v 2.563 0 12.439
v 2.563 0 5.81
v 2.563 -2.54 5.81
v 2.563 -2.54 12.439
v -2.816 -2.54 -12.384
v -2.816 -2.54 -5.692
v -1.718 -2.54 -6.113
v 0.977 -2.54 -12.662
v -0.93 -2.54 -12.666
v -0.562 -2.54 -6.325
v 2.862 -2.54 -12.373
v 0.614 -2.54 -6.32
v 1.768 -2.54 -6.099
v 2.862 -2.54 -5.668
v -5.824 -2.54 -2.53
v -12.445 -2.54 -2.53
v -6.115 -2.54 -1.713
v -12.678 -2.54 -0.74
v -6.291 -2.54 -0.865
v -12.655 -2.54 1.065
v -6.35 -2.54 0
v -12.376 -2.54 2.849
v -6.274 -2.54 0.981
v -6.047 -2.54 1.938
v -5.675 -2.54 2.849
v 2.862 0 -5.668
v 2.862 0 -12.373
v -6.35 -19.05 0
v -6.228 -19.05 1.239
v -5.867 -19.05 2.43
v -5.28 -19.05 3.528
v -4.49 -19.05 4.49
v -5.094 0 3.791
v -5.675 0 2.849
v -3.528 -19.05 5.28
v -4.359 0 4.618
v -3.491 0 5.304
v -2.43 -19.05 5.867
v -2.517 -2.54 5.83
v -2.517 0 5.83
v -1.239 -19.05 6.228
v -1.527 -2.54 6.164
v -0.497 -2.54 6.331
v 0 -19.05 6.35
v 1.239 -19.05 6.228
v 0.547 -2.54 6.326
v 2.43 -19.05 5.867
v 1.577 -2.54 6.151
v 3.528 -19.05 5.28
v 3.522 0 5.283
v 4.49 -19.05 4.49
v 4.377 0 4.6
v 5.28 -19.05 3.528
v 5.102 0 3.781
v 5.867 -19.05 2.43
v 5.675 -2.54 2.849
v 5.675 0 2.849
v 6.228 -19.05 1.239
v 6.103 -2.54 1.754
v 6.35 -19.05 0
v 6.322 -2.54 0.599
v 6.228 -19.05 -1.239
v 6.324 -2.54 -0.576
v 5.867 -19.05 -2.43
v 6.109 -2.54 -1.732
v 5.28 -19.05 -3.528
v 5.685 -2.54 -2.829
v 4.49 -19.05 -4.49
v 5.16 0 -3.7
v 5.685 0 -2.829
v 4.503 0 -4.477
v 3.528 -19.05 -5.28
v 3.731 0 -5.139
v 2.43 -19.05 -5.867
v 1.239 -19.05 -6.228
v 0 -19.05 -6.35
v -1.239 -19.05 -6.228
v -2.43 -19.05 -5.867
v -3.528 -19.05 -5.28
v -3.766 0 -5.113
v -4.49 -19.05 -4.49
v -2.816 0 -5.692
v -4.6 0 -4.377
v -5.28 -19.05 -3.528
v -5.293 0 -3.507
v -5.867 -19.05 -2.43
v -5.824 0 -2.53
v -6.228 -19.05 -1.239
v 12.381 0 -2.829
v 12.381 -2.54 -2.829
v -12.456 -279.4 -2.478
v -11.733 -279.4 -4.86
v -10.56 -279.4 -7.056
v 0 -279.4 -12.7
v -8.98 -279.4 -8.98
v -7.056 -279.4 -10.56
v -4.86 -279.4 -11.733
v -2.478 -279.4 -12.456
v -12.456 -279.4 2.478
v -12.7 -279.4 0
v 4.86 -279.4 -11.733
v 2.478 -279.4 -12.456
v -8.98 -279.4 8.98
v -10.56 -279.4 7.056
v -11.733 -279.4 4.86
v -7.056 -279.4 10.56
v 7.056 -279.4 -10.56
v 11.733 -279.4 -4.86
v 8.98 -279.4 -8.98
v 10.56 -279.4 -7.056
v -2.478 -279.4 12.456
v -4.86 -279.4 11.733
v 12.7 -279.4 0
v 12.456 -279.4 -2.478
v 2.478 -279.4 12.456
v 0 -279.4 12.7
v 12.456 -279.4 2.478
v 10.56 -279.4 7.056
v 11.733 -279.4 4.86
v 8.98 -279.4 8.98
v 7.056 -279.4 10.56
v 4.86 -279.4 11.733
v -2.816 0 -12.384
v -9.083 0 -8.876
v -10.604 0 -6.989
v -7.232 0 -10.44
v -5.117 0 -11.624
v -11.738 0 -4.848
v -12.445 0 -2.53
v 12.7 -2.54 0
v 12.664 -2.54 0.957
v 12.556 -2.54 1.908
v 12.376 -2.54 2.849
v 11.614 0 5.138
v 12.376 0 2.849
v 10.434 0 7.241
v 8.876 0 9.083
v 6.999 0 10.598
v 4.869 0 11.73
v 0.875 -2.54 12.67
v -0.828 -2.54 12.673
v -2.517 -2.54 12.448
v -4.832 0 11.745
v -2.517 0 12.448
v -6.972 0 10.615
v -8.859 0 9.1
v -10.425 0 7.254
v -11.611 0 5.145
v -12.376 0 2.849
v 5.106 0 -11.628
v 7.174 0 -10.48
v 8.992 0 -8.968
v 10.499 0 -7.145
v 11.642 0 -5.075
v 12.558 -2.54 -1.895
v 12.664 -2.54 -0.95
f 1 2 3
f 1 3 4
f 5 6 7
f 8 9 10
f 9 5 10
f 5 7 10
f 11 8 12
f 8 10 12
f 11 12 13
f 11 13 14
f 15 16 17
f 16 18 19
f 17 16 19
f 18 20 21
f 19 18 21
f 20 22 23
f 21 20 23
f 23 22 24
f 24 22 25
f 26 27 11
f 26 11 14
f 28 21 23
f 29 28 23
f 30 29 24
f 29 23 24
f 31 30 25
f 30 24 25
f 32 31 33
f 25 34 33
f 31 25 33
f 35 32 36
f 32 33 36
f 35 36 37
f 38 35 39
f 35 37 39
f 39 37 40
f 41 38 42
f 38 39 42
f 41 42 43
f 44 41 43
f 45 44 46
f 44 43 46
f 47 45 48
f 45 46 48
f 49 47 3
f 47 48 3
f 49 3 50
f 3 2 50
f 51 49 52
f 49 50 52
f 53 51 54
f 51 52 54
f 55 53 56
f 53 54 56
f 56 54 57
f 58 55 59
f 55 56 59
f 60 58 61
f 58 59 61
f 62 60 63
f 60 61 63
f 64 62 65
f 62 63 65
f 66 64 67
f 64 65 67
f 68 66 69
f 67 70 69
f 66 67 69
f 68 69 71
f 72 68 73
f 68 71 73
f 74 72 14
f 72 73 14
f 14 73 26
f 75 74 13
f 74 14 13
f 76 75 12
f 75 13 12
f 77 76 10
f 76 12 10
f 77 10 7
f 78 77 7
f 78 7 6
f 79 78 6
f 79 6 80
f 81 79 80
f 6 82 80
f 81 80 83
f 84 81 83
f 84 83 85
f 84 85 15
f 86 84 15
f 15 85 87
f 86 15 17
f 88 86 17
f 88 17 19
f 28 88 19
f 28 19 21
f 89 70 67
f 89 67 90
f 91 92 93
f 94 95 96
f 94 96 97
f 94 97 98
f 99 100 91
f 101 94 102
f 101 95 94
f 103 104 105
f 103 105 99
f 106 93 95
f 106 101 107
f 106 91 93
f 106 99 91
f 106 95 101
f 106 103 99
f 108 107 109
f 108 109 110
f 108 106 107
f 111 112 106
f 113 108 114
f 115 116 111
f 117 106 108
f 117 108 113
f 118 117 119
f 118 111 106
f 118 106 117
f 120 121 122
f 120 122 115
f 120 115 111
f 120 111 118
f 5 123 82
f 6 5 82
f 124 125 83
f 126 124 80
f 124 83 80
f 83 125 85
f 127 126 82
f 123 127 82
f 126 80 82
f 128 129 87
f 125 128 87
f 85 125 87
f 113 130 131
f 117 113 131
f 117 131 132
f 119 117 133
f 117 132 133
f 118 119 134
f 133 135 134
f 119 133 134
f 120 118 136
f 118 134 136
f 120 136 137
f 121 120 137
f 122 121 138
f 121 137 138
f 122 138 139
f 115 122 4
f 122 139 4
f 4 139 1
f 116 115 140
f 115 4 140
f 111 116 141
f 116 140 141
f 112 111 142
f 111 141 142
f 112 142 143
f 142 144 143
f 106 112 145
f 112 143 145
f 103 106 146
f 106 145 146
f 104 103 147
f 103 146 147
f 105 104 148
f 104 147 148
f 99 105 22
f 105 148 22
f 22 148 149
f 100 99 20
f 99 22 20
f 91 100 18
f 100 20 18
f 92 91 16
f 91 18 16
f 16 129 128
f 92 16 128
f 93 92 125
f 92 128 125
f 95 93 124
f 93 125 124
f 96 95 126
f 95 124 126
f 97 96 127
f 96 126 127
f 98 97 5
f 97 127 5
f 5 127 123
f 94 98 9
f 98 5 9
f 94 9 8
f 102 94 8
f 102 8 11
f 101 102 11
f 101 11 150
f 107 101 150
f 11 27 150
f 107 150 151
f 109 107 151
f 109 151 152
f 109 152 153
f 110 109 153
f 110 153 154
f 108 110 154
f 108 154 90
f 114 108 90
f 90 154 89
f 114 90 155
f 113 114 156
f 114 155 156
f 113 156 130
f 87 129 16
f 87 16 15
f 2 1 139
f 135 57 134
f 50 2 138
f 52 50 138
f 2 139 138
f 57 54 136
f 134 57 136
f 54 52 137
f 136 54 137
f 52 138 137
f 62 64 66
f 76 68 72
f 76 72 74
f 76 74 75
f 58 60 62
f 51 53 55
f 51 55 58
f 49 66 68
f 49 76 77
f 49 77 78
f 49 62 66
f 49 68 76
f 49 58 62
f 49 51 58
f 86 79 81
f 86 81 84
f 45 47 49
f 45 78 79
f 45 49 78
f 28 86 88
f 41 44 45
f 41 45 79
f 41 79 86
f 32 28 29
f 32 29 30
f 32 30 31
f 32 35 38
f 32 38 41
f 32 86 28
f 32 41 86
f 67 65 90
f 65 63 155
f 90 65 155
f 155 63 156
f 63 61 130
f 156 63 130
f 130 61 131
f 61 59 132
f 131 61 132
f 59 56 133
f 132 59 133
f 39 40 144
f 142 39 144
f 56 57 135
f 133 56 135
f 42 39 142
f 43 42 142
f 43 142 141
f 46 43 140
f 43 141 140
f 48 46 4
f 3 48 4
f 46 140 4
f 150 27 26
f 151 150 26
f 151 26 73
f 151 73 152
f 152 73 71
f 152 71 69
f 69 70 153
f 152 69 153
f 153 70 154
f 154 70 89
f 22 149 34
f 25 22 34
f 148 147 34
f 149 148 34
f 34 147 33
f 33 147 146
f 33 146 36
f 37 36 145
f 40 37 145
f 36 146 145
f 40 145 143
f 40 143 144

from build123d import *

# Parameters (mm, degrees)
F0_R     = 12.7
F1_DEPTH = 279.4
F2_R     = 6.35
F3_DEPTH = 19.05
F4_W     = 5.08
F4_H     = 10.381874
F4_W_2   = 11.262799
F4_H_2   = 5.378819
F4_W_3   = 5.677644
F4_H_3   = 9.531256
F4_W_4   = 10.833798
F4_H_4   = 5.677642
F5_DEPTH = 2.54


with BuildPart() as f1:
    # F0 (on Front) → F1 (new body)
    with BuildSketch(Plane.XZ):
        Circle(F0_R)
    extrude(amount=F1_DEPTH)

    # F2 (on face) → F3 (cut)
    with BuildSketch(Plane(origin=(0, 0, 0), x_dir=(-1, 0, 0), z_dir=(0, 1, 0))):
        Circle(F2_R)
    extrude(amount=-F3_DEPTH, mode=Mode.SUBTRACT)

    # F4 (on Front) → F5 (cut)
    with BuildSketch(Plane.XZ):
        with Locations((0.023213, 10.806244)):
            Rectangle(F4_W, F4_H)
        with Locations((-10.631255, 0.159545)):
            Rectangle(F4_W_2, F4_H_2)
        with Locations((0.023213, -9.717169)):
            Rectangle(F4_W_3, F4_H_3)
        with Locations((10.593361, 0.010134)):
            Rectangle(F4_W_4, F4_H_4)
    extrude(amount=F5_DEPTH, mode=Mode.SUBTRACT)


solid = f1.part
